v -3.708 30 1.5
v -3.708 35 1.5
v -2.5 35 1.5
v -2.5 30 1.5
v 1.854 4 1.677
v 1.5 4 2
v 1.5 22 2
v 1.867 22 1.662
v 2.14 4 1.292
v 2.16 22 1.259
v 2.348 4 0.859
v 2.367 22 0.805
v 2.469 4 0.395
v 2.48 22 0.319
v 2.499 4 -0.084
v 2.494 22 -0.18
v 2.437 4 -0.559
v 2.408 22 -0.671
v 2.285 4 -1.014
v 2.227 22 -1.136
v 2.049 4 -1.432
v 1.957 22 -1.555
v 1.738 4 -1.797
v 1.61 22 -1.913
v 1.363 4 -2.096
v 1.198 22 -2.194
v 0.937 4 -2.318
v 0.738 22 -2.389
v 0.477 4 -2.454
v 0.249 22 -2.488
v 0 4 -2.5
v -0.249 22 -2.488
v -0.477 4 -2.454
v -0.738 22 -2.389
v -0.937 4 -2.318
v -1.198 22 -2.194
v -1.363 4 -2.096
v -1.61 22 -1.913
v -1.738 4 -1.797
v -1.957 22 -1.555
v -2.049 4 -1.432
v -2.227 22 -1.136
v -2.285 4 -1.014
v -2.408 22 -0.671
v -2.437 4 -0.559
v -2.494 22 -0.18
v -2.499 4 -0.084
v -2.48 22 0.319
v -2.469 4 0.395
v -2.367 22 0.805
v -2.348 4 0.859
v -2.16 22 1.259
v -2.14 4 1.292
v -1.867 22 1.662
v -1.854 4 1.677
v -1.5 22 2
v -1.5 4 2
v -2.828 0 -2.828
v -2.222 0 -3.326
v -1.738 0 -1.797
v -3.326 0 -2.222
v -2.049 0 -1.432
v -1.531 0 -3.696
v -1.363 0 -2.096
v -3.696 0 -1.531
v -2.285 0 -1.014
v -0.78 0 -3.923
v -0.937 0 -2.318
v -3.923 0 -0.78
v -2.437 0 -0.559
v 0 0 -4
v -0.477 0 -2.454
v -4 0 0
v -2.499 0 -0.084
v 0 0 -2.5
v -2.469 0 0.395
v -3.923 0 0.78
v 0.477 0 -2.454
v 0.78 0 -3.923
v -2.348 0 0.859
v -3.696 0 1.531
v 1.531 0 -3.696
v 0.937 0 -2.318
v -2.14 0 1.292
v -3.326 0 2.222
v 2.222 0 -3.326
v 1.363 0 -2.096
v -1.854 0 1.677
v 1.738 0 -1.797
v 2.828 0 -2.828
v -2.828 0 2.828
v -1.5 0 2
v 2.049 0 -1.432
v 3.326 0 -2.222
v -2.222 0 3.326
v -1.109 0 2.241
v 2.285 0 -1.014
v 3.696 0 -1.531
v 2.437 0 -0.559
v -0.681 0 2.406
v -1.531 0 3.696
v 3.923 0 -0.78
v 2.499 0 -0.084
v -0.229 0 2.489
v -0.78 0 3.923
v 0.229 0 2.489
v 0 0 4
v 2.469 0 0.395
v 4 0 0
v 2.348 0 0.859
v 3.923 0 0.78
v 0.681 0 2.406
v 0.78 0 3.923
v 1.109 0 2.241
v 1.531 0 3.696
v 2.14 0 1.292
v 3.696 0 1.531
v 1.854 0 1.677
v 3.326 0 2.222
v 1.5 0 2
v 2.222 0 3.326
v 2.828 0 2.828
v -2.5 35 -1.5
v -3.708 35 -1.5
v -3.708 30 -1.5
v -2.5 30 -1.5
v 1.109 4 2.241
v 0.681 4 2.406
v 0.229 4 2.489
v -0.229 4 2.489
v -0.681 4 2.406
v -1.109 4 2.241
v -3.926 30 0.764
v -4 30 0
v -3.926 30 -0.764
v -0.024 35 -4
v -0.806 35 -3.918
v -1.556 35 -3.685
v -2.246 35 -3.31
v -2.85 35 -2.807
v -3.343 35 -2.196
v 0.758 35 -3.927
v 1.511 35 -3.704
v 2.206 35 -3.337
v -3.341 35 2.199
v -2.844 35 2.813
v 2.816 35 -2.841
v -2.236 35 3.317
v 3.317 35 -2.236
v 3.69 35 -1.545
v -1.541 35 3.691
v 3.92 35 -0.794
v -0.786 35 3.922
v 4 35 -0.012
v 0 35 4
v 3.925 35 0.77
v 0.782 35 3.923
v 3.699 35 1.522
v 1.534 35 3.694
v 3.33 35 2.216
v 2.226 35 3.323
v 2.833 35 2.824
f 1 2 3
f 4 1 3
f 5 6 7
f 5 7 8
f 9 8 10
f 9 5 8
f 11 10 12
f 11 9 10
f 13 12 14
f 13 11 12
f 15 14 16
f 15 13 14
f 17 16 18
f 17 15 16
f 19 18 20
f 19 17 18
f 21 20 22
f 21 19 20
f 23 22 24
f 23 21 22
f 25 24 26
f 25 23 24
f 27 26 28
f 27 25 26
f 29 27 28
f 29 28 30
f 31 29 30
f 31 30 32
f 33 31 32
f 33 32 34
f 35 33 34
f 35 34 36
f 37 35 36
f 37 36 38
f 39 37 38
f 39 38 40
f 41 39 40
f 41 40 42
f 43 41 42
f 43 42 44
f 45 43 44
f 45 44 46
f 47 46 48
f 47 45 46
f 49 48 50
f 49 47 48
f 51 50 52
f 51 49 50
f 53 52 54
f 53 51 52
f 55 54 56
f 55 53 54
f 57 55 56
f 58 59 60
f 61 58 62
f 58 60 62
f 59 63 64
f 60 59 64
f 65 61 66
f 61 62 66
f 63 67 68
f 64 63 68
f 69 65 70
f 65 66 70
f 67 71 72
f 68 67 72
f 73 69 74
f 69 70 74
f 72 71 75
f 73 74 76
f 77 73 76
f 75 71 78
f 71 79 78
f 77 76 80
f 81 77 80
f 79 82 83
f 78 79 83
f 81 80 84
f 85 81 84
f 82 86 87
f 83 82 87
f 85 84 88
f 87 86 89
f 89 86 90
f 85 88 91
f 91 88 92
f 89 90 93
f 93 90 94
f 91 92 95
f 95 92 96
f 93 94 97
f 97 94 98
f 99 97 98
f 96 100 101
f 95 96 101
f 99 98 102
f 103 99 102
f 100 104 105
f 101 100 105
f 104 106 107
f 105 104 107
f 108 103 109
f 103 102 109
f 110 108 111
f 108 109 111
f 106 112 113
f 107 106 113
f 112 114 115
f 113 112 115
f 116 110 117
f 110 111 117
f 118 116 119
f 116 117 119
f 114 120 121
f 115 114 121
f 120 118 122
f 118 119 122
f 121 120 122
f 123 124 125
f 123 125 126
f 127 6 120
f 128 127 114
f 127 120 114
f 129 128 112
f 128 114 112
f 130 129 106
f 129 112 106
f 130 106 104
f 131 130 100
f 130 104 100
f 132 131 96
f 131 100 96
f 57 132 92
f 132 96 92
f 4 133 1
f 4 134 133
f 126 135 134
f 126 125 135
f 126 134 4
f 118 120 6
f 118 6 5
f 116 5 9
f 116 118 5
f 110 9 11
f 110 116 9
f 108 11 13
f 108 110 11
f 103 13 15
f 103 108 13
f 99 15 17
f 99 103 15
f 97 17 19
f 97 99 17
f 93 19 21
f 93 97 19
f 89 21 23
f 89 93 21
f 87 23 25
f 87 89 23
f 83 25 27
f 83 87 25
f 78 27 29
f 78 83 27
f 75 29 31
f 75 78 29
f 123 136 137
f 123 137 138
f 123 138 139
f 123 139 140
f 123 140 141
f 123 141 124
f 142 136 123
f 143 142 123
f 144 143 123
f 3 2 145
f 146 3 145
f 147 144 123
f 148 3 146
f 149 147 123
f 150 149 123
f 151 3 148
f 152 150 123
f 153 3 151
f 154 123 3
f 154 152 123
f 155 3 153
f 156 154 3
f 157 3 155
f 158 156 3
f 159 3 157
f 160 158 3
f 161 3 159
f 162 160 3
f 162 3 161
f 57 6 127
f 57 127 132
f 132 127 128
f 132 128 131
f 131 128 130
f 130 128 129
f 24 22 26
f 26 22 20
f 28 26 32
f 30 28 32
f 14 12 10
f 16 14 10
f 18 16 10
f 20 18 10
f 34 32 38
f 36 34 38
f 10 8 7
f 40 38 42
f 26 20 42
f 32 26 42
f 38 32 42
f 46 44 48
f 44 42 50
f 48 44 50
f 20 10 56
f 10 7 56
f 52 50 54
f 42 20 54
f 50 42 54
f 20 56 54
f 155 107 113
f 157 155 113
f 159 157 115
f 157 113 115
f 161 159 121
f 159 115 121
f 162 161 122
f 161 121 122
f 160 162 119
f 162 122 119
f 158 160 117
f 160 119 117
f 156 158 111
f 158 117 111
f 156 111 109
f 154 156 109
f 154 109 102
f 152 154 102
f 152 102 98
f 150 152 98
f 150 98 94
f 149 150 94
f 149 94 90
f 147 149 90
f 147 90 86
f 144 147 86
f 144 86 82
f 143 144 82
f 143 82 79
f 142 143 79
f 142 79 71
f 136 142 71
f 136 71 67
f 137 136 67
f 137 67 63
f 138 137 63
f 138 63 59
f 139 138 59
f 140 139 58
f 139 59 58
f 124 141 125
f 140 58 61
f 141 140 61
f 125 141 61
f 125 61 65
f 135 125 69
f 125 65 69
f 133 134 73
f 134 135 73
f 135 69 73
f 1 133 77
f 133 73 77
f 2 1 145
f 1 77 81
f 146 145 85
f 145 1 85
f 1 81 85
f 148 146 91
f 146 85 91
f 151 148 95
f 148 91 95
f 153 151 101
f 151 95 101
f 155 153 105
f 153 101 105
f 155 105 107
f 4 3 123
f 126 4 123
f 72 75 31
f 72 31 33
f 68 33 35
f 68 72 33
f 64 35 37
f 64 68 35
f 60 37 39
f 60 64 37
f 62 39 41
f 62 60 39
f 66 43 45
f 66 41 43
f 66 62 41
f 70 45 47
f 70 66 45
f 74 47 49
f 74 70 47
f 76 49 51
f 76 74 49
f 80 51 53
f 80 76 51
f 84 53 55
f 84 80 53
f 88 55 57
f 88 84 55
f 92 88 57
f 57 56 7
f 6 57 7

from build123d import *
from build123d.topology import SkipClean

# Parameters (mm, degrees)
SKETCH1_R           = 4
BOSS_EXTRUDE1_DEPTH = 35
CUT_EXTRUDE1_DEPTH  = 22
SKETCH3_R           = 2.5
CUT_EXTRUDE2_DEPTH  = 4
SKETCH4_W           = 3
SKETCH4_H           = 3
CUT_EXTRUDE3_DEPTH  = 5


with BuildPart() as part:
    # Sketch1 → Boss-Extrude1 (new body)
    with BuildSketch(Plane(origin=(0, 0, 0), x_dir=(1, 0, 0), z_dir=(0, 1, 0))):
        with Locations(Location((0, 0, 0), (0, 0, 270))):
            Circle(SKETCH1_R)
    extrude(amount=BOSS_EXTRUDE1_DEPTH)

    # Sketch2 → Cut-Extrude1 (cut)
    with BuildSketch(Plane.XZ):
        with BuildLine():
            Line((-1.5, 2), (1.5, 2))
            ThreePointArc((1.5, 2), (0, -2.5), (-1.5, 2))
        make_face()
    extrude(amount=-CUT_EXTRUDE1_DEPTH, mode=Mode.SUBTRACT)

    # Sketch3 → Cut-Extrude2 (cut)
    with SkipClean():  # the faces are left unmerged after this step: merging them gives an invalid solid
        with BuildSketch(Plane.XZ):
            with Locations(Location((0, 0, 0), (0, 0, 270))):
                Circle(SKETCH3_R)
        extrude(amount=-CUT_EXTRUDE2_DEPTH, mode=Mode.SUBTRACT)

    # Sketch4 → Cut-Extrude3 (cut)
    with SkipClean():  # the faces are left unmerged after this step: merging them gives an invalid solid
        with BuildSketch(Plane(origin=(0, 35, 0), x_dir=(1, 0, 0), z_dir=(0, 1, 0))):
            with Locations((-4, 0)):
                Rectangle(SKETCH4_W, SKETCH4_H)
        extrude(amount=-CUT_EXTRUDE3_DEPTH, mode=Mode.SUBTRACT)


solid = part.part
